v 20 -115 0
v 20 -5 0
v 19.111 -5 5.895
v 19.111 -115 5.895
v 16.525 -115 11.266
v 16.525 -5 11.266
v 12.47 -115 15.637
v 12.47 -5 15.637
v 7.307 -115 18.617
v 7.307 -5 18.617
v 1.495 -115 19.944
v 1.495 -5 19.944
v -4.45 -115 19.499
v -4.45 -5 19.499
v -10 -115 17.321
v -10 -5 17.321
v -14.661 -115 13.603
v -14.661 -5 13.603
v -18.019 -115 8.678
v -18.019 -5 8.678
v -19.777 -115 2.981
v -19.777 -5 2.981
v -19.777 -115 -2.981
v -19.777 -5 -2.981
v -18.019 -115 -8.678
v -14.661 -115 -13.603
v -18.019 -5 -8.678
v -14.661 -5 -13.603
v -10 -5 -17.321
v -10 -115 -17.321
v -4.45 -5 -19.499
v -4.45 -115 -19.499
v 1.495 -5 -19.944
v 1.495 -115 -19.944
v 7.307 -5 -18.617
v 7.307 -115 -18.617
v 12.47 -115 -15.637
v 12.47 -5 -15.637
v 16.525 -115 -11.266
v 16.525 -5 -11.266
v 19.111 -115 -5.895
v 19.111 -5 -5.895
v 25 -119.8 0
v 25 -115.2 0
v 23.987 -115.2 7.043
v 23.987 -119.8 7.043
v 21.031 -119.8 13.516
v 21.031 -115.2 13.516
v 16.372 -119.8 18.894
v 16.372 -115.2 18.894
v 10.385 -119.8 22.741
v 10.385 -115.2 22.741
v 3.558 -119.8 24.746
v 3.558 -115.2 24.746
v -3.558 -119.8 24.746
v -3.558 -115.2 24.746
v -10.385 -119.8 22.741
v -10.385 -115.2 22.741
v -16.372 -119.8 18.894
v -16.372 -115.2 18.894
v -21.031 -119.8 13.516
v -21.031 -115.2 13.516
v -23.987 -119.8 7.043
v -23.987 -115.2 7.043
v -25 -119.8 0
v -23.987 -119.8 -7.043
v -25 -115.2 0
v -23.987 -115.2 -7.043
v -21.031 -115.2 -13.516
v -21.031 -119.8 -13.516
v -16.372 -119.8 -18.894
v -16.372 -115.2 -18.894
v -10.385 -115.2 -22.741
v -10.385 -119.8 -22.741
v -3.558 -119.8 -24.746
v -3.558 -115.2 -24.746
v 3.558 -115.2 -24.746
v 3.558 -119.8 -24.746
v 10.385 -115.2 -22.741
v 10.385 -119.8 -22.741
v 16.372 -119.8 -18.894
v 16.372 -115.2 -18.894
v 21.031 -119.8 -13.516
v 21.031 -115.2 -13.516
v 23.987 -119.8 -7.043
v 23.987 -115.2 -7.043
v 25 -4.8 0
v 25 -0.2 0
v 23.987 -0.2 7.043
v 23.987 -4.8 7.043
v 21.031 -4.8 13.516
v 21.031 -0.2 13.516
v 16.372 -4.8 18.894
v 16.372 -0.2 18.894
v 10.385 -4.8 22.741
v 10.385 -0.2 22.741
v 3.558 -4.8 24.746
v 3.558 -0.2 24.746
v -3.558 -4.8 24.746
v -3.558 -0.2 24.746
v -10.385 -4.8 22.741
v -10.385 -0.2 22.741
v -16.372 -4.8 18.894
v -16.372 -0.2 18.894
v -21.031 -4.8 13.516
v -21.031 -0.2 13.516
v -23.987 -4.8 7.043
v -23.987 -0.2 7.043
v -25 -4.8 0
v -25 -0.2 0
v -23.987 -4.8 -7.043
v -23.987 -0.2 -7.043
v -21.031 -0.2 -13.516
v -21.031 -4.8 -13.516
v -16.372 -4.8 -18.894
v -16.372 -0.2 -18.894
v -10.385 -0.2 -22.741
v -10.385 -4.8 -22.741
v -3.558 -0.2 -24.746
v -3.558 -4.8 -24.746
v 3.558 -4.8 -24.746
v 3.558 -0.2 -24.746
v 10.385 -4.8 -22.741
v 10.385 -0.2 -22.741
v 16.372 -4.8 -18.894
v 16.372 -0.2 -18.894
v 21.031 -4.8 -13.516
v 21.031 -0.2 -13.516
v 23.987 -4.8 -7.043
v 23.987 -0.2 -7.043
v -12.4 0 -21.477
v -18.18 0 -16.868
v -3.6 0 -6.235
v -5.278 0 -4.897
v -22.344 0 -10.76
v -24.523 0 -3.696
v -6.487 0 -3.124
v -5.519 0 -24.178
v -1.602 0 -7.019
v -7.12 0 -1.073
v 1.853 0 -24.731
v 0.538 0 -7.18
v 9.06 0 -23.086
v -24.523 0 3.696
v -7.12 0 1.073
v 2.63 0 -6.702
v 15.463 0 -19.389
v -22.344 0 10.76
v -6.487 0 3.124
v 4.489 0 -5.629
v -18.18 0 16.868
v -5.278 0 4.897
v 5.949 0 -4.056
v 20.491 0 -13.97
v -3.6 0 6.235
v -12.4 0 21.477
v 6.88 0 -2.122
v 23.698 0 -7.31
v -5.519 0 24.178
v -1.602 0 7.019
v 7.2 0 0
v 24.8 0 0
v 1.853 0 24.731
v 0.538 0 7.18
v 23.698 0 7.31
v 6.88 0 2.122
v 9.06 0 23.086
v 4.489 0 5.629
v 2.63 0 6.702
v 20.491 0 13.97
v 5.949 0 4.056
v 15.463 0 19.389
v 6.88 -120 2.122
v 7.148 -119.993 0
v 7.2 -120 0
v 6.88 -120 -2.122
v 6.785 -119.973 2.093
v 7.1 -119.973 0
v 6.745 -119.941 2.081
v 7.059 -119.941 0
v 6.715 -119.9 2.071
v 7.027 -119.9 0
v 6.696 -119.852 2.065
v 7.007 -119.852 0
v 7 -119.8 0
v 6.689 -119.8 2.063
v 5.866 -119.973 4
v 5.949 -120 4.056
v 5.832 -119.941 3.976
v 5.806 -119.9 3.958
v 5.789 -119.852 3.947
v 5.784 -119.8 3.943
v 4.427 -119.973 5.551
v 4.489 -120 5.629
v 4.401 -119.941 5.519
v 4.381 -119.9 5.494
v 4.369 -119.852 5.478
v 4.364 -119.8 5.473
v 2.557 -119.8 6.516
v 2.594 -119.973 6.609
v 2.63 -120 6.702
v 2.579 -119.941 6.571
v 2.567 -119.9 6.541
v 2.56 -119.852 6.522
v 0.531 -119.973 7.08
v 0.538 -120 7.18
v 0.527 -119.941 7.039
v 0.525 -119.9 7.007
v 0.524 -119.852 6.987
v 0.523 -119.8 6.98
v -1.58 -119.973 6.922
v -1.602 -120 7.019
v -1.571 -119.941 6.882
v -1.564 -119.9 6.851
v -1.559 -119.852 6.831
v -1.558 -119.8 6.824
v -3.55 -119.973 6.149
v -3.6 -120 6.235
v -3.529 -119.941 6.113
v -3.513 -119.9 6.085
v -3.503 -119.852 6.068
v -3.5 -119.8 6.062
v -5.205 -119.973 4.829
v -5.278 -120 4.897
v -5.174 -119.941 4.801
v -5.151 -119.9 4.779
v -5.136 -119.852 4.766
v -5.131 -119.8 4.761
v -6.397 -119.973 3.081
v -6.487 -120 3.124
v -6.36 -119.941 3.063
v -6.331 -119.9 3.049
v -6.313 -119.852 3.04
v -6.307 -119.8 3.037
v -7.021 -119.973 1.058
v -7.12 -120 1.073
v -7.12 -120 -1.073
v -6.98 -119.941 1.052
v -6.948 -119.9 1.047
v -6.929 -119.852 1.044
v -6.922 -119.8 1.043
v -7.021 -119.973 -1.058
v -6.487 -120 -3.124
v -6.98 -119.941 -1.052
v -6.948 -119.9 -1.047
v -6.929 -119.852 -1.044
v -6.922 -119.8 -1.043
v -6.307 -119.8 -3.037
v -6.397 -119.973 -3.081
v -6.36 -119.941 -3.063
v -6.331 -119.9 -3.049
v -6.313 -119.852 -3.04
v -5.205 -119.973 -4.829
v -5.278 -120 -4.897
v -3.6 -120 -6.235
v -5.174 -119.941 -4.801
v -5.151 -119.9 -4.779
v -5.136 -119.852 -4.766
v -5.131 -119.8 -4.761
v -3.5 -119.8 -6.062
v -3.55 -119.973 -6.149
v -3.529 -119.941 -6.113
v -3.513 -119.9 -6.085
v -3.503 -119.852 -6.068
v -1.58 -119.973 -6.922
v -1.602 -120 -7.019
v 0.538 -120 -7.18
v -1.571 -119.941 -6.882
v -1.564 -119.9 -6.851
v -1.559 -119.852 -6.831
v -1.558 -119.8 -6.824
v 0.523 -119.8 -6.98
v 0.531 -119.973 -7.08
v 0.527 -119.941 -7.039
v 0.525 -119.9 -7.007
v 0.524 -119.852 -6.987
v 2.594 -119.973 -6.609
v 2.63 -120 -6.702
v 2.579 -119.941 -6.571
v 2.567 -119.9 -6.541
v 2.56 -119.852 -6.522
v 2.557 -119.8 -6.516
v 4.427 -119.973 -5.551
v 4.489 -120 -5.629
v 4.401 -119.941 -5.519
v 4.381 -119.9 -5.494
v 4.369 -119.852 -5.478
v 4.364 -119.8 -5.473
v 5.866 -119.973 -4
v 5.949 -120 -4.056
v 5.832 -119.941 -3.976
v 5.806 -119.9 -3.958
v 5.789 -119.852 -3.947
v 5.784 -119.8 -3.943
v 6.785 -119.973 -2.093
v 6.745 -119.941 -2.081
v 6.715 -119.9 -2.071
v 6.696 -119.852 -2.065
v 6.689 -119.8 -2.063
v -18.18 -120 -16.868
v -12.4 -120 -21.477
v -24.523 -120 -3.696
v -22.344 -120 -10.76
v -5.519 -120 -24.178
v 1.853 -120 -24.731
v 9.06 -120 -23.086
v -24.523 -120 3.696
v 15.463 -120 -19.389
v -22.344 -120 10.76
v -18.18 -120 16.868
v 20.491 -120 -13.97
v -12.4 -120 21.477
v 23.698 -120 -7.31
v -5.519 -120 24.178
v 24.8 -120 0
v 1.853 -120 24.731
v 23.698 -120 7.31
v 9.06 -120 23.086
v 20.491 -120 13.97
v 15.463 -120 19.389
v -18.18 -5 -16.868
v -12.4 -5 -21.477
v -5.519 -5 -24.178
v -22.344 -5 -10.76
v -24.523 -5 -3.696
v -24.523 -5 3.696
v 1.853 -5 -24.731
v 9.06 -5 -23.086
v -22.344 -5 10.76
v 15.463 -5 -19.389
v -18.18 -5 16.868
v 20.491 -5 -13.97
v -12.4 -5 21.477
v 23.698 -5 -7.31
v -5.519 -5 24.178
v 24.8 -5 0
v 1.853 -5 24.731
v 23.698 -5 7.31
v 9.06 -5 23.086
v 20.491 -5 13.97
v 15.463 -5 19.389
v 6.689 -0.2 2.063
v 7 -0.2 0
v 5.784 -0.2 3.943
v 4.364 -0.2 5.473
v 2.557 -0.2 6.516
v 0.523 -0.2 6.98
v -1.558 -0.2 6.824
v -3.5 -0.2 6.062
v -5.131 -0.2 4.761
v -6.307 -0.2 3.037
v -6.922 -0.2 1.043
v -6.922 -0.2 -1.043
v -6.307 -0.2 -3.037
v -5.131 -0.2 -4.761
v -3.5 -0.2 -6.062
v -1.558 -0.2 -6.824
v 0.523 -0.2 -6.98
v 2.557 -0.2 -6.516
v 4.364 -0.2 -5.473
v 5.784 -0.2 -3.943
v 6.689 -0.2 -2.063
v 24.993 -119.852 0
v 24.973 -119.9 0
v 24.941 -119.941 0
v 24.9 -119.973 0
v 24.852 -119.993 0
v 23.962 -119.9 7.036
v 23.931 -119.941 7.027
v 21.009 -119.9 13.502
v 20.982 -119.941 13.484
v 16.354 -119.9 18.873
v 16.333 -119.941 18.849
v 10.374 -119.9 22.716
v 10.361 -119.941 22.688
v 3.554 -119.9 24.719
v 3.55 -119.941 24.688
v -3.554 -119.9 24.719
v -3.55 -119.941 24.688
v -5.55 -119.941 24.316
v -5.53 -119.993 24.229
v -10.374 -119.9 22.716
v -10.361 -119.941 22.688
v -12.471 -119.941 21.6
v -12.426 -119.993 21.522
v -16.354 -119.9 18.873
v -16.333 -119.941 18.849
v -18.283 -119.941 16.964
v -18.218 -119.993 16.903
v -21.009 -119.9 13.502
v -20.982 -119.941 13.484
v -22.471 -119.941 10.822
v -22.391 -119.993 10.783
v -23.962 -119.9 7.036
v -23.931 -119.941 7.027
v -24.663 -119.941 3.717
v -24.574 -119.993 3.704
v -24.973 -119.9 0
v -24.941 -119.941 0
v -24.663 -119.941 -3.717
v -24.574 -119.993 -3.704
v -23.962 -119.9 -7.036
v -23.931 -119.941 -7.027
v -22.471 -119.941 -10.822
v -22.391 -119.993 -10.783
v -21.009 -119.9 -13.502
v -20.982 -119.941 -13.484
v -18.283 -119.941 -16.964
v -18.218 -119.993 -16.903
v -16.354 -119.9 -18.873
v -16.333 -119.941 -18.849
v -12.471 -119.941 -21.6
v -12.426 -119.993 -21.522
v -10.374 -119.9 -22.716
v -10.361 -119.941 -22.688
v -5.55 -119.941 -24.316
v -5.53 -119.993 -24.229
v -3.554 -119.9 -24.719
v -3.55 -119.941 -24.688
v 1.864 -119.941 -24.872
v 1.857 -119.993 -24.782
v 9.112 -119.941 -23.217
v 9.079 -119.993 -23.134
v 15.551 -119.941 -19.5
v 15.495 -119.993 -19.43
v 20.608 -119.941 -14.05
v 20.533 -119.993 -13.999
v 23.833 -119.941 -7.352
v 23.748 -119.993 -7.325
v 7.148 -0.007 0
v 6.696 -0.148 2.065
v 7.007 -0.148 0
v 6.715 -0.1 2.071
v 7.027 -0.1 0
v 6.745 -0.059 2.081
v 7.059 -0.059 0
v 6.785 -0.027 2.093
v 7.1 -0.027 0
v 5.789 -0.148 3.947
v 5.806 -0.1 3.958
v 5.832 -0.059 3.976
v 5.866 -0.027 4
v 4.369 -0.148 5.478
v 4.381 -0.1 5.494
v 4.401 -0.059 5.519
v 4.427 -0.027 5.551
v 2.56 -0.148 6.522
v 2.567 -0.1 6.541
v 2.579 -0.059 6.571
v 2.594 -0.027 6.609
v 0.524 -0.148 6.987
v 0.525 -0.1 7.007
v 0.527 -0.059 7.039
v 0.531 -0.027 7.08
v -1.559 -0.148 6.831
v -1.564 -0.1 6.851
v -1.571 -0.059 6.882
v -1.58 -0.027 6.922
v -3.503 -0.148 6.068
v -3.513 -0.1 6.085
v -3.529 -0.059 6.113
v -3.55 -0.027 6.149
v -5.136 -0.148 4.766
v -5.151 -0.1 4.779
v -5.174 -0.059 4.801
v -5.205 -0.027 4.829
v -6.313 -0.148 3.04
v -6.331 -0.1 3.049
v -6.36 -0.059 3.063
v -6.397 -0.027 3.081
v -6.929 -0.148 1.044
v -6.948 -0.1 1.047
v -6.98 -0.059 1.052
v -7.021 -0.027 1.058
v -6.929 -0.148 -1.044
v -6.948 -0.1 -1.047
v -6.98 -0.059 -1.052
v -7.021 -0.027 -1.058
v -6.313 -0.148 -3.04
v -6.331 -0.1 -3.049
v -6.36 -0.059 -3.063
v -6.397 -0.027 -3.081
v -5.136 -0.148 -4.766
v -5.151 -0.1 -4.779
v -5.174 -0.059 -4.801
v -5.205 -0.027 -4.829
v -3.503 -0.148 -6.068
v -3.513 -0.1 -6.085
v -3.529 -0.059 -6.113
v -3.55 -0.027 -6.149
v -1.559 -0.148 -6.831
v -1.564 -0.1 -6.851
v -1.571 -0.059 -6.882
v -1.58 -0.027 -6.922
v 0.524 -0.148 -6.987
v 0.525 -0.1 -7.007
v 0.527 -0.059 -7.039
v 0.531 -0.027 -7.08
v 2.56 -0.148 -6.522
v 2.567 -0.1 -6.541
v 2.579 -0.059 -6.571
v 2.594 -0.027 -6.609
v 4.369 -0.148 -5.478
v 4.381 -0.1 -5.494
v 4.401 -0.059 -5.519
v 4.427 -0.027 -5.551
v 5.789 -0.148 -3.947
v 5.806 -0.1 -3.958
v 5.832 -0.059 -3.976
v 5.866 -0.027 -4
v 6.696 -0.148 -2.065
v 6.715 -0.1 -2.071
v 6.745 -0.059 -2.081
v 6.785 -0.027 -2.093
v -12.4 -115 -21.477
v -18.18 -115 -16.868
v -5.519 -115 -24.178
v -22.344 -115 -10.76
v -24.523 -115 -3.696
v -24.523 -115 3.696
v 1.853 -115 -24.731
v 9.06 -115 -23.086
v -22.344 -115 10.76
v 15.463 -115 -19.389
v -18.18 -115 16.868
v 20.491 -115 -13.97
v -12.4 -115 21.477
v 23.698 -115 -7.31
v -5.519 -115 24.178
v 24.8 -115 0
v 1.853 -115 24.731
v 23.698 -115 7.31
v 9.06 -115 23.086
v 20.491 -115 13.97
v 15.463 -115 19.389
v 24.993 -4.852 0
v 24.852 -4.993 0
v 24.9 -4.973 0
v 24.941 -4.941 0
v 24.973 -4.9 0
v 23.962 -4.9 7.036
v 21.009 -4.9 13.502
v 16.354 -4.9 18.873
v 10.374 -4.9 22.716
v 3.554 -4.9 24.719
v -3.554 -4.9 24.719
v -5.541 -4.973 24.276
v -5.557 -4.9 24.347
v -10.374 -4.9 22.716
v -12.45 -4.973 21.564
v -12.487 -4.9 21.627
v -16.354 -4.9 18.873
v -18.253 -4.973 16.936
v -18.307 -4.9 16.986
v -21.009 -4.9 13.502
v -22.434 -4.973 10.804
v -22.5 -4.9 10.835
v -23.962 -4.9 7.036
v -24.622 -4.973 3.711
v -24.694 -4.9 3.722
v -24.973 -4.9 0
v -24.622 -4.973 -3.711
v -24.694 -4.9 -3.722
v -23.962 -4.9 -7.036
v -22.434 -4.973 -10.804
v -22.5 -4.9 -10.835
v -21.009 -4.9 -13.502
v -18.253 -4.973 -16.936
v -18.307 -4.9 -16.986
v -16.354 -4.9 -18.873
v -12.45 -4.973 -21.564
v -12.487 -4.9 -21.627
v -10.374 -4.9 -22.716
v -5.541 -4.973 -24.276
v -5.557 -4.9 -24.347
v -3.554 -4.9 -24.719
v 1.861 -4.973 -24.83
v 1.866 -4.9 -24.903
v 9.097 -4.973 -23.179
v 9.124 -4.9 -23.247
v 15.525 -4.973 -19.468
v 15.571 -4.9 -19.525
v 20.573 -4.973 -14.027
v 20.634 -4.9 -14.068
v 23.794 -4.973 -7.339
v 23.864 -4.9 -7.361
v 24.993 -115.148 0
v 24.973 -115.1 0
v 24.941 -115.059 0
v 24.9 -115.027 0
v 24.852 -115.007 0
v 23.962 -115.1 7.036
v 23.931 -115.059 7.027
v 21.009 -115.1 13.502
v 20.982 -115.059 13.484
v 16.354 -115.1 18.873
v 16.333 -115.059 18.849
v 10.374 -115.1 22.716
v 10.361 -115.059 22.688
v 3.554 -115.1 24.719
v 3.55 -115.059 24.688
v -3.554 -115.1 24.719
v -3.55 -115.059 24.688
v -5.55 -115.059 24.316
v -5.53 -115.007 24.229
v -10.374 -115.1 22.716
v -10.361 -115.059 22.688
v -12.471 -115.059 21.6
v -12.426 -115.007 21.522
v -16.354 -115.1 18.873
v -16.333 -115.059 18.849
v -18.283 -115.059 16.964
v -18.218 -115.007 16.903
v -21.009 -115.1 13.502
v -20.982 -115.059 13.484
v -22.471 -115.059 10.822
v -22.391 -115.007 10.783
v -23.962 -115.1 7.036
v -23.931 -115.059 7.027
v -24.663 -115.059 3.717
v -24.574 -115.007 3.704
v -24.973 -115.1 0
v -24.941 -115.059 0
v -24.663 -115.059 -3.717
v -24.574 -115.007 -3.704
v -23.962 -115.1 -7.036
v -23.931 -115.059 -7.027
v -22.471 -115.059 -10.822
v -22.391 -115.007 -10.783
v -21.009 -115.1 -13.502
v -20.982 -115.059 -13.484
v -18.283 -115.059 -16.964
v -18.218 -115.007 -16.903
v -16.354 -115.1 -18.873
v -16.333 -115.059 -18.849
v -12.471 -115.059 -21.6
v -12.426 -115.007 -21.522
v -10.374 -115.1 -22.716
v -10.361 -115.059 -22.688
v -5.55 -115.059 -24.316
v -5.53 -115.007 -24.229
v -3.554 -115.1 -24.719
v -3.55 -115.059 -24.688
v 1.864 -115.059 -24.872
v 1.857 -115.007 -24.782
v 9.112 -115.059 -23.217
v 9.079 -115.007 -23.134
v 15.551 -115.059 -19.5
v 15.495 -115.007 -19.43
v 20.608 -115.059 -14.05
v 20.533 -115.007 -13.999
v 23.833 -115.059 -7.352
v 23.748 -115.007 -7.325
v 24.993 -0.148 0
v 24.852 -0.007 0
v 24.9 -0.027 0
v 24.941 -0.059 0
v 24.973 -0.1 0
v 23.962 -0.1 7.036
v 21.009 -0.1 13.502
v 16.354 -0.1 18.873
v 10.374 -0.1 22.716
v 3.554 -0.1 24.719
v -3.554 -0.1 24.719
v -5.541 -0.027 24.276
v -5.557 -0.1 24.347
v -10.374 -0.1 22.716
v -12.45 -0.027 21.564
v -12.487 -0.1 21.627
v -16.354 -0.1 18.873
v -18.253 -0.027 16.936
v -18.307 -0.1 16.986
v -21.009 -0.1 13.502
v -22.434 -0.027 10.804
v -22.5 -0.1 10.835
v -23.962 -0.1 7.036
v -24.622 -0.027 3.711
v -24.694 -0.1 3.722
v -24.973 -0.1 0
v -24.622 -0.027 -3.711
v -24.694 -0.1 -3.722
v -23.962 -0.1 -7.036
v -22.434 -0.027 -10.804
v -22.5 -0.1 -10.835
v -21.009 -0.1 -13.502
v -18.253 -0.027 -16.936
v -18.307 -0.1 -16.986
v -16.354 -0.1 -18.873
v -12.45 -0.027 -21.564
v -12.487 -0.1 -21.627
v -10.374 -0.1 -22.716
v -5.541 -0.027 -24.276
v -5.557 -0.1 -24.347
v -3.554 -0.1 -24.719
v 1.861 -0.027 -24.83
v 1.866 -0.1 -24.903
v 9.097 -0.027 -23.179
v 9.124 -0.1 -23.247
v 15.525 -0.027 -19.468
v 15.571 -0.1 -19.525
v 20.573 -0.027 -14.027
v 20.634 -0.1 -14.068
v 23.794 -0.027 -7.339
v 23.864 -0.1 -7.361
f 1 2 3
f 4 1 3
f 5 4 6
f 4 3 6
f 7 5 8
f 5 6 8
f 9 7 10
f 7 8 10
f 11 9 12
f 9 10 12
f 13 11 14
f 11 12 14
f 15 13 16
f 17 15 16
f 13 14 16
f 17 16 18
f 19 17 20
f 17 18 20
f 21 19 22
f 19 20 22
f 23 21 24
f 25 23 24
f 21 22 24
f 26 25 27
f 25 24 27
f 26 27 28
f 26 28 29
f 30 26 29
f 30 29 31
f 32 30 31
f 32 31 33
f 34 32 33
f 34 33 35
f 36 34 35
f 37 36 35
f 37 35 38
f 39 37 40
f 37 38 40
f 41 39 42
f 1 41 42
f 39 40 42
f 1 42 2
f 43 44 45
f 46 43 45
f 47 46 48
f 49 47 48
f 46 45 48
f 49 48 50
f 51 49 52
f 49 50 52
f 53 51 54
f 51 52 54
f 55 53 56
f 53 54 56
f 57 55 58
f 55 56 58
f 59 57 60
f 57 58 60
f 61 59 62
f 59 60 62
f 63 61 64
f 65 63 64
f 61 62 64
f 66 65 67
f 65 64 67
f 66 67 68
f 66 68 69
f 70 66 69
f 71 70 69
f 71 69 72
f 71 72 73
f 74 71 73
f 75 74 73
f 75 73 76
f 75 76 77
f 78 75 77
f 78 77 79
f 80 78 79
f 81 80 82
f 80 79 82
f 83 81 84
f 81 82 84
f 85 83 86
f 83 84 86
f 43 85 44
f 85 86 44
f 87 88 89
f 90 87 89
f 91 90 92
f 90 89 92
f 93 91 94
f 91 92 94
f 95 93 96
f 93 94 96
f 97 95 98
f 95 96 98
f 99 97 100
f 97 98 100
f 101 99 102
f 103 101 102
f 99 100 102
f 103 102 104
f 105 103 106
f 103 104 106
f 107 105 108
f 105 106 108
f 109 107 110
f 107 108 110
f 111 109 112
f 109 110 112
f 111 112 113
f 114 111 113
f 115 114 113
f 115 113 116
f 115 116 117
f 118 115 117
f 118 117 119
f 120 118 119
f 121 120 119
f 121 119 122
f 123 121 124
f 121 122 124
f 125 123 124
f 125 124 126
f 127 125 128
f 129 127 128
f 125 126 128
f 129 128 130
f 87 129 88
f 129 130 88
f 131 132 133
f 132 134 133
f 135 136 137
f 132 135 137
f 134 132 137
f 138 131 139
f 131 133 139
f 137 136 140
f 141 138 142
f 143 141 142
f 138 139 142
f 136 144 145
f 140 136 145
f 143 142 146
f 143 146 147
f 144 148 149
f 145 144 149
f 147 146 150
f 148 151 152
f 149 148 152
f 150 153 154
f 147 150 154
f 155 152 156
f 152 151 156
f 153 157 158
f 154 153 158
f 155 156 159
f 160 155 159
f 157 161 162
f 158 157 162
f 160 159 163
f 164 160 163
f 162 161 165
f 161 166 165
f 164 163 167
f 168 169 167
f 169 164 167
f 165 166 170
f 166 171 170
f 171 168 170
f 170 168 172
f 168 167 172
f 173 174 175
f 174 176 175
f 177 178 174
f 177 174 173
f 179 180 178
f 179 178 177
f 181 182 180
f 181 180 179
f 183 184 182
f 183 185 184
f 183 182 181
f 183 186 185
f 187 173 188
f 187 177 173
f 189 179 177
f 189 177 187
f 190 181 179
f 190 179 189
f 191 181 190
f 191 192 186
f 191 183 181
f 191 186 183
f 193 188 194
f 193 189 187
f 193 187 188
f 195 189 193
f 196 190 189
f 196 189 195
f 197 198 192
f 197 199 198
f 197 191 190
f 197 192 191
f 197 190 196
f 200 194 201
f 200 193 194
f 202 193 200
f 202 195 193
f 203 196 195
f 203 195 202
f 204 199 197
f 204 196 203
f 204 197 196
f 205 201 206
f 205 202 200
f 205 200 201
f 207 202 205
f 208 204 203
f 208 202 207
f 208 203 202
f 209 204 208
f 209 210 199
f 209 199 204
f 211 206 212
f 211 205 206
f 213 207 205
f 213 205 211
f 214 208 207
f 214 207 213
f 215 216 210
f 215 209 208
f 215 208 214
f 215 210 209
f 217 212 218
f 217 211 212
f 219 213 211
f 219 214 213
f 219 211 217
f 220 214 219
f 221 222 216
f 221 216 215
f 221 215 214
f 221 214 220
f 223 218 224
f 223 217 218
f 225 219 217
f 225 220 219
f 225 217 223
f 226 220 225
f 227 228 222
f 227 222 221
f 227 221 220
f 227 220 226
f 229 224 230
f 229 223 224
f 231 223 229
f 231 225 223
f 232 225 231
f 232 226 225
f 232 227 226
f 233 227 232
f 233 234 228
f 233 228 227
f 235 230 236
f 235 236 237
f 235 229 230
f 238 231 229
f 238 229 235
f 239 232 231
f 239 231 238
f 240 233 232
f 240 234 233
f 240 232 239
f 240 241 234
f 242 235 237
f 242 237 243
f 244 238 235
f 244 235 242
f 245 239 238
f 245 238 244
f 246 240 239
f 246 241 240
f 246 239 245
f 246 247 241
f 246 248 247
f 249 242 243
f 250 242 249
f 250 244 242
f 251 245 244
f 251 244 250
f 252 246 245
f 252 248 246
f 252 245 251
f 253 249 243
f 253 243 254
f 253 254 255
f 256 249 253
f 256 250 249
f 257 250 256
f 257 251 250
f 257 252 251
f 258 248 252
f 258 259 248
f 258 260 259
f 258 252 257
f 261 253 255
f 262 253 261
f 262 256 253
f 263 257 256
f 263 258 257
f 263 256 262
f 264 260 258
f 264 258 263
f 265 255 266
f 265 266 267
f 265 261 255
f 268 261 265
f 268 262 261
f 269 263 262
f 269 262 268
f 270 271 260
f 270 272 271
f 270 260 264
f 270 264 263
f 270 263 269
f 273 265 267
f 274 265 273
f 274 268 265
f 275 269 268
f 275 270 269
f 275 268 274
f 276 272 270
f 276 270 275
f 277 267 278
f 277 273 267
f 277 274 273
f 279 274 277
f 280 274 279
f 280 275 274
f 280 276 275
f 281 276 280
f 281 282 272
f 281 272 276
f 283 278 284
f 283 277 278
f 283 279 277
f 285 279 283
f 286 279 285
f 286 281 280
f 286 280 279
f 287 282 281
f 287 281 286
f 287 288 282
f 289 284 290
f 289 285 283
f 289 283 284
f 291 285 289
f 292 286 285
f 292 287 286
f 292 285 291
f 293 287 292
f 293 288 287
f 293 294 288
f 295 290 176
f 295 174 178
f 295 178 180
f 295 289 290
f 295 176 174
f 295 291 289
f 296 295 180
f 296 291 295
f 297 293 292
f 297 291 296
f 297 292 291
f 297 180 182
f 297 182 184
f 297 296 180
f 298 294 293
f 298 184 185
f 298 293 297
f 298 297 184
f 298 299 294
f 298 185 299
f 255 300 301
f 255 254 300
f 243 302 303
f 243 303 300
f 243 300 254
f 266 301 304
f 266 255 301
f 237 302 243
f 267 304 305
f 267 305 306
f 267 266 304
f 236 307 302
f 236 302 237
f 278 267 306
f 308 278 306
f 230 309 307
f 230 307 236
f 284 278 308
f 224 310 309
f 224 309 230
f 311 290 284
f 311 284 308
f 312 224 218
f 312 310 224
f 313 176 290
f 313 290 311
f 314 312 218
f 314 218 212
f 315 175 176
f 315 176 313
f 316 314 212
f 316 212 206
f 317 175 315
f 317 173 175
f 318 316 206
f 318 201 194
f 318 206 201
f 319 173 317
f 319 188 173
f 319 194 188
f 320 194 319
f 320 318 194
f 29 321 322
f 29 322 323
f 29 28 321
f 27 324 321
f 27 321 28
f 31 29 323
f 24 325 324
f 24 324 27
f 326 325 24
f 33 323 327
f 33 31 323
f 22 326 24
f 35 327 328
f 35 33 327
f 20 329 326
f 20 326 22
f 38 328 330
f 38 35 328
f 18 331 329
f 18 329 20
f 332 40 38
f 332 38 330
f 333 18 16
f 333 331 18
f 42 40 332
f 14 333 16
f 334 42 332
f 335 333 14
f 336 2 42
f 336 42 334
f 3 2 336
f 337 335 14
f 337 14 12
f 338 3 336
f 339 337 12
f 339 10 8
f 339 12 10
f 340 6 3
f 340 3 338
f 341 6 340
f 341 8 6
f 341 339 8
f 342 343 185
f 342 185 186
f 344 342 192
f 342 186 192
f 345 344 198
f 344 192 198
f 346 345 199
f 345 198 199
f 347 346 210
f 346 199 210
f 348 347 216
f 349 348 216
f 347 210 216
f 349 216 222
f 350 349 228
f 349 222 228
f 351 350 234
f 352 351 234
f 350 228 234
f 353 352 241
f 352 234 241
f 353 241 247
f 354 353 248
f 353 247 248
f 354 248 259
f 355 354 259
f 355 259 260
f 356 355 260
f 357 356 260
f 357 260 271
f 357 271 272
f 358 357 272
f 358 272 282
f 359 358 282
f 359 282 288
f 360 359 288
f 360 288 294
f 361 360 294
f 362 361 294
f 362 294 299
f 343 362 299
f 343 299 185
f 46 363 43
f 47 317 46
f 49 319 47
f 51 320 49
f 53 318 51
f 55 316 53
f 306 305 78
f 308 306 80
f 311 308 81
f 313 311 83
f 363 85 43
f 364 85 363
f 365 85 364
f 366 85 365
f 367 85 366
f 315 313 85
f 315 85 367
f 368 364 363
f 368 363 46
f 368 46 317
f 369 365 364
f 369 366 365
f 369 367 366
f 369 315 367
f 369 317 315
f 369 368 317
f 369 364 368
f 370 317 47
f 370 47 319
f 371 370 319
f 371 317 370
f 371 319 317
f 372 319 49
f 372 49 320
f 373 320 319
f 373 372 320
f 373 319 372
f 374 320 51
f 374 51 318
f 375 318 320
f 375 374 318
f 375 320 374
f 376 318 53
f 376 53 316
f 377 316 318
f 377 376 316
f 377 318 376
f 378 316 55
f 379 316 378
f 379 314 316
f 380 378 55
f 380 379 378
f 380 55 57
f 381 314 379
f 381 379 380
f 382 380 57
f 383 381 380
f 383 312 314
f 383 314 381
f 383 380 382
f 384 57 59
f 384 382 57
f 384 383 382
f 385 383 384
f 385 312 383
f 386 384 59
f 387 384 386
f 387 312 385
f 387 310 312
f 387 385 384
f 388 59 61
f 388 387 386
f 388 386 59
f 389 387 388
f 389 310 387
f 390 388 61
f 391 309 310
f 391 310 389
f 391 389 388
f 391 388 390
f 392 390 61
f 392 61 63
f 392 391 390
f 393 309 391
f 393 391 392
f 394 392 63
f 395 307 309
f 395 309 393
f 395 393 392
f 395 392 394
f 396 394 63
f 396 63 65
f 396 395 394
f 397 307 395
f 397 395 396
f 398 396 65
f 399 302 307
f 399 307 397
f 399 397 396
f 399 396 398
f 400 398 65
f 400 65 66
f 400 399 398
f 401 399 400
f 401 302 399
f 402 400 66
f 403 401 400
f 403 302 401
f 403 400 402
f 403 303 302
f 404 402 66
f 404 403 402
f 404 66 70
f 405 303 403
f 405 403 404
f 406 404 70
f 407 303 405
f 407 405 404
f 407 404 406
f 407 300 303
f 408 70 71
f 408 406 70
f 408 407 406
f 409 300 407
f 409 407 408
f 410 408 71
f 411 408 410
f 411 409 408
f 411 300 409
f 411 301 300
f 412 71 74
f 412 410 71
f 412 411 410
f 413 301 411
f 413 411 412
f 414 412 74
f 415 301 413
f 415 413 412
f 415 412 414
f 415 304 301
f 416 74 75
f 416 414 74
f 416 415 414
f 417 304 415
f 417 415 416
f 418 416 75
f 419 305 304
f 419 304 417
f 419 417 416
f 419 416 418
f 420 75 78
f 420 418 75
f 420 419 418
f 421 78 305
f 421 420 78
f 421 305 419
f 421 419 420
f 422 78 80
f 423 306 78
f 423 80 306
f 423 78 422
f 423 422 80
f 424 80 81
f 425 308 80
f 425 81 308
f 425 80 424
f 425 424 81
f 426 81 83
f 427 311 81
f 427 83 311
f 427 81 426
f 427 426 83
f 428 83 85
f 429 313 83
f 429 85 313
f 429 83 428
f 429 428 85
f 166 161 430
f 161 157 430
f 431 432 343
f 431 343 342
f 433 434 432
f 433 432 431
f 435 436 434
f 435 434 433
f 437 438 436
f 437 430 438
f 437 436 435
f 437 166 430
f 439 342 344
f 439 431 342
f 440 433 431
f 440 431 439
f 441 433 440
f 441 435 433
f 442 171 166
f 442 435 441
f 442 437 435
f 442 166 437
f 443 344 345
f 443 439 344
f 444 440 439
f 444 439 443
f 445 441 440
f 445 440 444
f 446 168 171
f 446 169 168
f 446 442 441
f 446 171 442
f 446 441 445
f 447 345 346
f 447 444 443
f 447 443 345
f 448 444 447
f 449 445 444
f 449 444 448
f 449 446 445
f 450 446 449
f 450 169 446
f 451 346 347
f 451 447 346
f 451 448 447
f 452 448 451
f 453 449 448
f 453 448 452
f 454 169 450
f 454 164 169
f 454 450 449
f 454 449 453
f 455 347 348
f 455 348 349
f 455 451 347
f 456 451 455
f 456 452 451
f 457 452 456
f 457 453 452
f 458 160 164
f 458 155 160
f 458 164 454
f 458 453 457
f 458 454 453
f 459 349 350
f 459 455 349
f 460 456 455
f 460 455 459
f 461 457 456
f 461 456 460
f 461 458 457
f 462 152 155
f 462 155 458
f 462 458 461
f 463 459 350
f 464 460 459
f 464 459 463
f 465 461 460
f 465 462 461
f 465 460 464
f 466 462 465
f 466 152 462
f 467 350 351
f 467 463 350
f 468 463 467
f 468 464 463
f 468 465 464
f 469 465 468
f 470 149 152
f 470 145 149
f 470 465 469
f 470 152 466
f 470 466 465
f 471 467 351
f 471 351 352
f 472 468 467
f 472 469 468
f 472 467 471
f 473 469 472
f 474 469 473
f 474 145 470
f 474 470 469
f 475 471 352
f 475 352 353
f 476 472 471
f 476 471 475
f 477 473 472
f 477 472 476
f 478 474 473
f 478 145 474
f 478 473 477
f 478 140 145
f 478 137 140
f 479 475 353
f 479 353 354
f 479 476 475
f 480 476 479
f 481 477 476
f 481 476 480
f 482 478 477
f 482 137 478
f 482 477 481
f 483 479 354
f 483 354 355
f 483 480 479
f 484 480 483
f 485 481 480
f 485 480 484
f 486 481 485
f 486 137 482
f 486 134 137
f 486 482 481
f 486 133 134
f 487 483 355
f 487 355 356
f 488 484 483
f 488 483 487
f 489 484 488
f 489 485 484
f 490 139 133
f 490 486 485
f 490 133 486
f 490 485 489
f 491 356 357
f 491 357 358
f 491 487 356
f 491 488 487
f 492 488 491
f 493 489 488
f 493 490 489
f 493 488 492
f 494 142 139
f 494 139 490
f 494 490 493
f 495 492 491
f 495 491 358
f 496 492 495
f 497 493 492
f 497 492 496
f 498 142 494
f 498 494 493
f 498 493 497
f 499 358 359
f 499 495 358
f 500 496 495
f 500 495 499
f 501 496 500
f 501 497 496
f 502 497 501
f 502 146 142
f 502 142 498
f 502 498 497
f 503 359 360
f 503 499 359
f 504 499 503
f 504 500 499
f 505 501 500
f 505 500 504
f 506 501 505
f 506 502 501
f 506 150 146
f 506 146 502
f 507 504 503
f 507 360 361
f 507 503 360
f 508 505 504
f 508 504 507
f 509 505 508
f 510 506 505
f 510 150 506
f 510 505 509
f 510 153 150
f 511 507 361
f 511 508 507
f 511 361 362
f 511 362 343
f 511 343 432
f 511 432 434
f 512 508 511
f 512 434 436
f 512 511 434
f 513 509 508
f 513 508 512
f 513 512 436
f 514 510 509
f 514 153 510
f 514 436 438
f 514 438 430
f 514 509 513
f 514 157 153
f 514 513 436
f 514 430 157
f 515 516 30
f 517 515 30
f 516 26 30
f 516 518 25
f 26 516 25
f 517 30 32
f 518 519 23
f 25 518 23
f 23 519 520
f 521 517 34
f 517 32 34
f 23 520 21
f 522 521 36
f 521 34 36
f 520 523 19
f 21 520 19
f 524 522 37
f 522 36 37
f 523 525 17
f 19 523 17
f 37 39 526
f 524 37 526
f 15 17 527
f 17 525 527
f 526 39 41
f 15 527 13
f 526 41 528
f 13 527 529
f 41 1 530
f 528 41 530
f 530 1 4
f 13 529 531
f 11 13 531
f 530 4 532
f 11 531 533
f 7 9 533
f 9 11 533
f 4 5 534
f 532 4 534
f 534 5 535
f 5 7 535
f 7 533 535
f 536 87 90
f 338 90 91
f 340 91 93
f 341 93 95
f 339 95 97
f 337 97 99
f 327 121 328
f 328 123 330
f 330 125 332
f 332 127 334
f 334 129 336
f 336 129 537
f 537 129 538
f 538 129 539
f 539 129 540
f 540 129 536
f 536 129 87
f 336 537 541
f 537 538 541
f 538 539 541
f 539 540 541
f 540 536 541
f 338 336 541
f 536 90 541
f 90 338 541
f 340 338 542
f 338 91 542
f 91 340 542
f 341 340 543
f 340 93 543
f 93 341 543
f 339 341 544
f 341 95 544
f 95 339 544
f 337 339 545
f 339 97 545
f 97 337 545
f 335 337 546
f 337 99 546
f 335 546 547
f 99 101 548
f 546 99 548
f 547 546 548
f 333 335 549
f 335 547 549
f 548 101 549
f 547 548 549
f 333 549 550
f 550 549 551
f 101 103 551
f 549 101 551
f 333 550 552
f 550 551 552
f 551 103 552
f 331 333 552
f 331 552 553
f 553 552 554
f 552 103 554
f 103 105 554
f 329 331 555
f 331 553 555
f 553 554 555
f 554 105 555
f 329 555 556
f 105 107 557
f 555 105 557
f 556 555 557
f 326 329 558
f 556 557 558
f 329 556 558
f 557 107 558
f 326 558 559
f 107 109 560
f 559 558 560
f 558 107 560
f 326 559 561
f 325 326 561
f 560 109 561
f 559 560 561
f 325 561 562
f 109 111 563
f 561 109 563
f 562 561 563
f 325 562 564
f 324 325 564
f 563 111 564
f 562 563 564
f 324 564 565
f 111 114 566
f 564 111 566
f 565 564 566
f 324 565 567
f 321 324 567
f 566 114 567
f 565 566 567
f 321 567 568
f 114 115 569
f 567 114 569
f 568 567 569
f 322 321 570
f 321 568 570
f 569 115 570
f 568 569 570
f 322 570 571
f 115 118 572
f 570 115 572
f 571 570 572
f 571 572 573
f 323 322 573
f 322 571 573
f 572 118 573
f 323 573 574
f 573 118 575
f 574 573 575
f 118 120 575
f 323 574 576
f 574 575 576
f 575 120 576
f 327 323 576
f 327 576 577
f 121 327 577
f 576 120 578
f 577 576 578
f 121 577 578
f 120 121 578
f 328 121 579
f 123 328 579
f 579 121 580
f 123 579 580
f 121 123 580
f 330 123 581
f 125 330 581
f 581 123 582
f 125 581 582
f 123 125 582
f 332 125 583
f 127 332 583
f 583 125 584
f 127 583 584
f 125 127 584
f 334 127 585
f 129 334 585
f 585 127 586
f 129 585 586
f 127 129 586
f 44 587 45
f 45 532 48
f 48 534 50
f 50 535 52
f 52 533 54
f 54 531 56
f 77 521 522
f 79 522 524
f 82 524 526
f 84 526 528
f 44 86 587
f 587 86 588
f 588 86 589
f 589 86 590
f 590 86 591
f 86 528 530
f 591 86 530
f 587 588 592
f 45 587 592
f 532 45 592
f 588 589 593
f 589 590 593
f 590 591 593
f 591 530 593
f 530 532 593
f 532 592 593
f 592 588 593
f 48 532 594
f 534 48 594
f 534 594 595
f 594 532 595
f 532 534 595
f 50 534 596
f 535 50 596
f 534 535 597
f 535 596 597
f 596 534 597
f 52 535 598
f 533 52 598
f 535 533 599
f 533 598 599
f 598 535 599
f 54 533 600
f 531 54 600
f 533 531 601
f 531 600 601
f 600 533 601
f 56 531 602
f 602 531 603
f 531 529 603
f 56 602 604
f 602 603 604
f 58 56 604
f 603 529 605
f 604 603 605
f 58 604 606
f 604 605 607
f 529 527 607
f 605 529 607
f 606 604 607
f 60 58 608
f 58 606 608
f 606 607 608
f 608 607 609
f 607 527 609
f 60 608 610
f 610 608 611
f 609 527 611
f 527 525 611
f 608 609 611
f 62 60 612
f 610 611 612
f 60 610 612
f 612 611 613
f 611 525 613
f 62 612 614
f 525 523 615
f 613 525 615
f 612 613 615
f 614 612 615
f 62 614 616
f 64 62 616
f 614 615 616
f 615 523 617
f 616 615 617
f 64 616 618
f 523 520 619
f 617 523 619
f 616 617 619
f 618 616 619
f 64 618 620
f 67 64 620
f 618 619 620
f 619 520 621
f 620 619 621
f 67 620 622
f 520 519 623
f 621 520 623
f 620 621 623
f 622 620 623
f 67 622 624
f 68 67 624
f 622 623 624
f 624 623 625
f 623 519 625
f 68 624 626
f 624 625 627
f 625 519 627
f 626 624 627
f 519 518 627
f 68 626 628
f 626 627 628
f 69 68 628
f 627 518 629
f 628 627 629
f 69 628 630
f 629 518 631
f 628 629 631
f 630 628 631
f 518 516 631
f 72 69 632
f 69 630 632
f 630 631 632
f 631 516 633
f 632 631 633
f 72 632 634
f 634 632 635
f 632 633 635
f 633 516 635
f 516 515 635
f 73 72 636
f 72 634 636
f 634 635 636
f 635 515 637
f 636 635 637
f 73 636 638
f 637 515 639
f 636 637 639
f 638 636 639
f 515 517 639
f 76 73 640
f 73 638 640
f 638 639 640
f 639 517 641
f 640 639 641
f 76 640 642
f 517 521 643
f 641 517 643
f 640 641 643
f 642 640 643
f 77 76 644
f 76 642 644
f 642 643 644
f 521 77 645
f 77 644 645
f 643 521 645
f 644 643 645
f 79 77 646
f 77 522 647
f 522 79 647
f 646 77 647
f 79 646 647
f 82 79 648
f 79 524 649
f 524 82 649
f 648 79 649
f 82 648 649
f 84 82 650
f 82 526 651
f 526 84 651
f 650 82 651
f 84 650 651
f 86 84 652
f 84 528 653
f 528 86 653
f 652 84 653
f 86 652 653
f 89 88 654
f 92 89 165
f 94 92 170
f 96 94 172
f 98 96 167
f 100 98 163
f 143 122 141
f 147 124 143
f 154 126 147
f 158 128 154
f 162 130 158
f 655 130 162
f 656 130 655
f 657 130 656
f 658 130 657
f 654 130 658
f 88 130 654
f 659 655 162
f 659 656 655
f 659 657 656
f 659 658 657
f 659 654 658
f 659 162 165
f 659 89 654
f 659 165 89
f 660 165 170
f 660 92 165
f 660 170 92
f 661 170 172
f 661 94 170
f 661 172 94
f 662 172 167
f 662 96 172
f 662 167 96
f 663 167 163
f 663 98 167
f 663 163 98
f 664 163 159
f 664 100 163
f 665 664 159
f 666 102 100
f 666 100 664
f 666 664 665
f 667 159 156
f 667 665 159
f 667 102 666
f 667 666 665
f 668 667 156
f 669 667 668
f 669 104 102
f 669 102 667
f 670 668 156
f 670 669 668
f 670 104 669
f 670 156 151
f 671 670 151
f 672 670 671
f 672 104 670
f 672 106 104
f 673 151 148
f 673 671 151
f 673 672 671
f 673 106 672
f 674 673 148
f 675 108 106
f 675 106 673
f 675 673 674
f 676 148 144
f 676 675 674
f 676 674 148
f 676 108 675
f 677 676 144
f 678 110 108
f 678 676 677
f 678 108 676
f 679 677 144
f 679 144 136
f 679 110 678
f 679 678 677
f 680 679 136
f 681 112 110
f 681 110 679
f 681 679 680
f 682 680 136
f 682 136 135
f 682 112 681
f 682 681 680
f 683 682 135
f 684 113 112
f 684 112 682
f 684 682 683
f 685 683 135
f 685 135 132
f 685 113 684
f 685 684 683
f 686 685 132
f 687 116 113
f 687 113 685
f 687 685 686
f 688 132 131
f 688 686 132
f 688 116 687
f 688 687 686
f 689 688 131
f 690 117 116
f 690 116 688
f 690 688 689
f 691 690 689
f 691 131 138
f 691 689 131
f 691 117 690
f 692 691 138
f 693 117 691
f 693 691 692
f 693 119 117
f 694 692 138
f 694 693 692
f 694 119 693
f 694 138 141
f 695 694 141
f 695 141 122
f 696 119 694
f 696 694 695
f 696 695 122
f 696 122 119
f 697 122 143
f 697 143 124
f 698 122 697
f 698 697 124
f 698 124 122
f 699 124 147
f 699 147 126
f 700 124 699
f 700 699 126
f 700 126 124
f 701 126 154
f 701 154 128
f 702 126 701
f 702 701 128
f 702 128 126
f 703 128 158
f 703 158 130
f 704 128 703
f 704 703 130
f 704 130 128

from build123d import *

# Parameters (mm, degrees)
F0_R     = 25
F1_DEPTH = 5
F2_R     = 20
F3_DEPTH = 110
F5_R     = 25
F4_R     = 20
F6_DEPTH = 5
F7_R     = 7
F8_DEPTH = 200
F9_R     = 0.2


# Not quite as in the source:
# - a feature names something its author has since deleted; it is built from what else it names


with BuildPart() as f1:
    # F0 (on Front) → F1 (new body)
    with BuildSketch(Plane.XZ):
        Circle(F0_R)
    extrude(amount=F1_DEPTH)

    # F2 (on face) → F3 (join)
    with BuildSketch(Plane.XZ.offset(5)):
        Circle(F2_R)
    extrude(amount=F3_DEPTH)

    # F5 (on face) + F4 (on face) → F6 (join)
    with BuildSketch(Plane.XZ.offset(115)):
        Circle(F5_R)
    with BuildSketch(Plane.XZ.offset(115)):
        Circle(F4_R)
    extrude(amount=F6_DEPTH)

    # F7 (on face) → F8 (cut)
    with BuildSketch(Plane.XZ.offset(120)):
        Circle(F7_R)
    extrude(amount=-F8_DEPTH, mode=Mode.SUBTRACT)

    # F9
    f9_edges = [f1.edges().sort_by_distance(p)[0] for p in [
        (-25, -120, 0),
        (-7, -120, 0),
        (-25, -115, 0),
        (-25, -5, 0),
        (-25, 0, 0),
        (-7, 0, 0),
    ]]
    fillet(f9_edges, radius=F9_R)


solid = f1.part
